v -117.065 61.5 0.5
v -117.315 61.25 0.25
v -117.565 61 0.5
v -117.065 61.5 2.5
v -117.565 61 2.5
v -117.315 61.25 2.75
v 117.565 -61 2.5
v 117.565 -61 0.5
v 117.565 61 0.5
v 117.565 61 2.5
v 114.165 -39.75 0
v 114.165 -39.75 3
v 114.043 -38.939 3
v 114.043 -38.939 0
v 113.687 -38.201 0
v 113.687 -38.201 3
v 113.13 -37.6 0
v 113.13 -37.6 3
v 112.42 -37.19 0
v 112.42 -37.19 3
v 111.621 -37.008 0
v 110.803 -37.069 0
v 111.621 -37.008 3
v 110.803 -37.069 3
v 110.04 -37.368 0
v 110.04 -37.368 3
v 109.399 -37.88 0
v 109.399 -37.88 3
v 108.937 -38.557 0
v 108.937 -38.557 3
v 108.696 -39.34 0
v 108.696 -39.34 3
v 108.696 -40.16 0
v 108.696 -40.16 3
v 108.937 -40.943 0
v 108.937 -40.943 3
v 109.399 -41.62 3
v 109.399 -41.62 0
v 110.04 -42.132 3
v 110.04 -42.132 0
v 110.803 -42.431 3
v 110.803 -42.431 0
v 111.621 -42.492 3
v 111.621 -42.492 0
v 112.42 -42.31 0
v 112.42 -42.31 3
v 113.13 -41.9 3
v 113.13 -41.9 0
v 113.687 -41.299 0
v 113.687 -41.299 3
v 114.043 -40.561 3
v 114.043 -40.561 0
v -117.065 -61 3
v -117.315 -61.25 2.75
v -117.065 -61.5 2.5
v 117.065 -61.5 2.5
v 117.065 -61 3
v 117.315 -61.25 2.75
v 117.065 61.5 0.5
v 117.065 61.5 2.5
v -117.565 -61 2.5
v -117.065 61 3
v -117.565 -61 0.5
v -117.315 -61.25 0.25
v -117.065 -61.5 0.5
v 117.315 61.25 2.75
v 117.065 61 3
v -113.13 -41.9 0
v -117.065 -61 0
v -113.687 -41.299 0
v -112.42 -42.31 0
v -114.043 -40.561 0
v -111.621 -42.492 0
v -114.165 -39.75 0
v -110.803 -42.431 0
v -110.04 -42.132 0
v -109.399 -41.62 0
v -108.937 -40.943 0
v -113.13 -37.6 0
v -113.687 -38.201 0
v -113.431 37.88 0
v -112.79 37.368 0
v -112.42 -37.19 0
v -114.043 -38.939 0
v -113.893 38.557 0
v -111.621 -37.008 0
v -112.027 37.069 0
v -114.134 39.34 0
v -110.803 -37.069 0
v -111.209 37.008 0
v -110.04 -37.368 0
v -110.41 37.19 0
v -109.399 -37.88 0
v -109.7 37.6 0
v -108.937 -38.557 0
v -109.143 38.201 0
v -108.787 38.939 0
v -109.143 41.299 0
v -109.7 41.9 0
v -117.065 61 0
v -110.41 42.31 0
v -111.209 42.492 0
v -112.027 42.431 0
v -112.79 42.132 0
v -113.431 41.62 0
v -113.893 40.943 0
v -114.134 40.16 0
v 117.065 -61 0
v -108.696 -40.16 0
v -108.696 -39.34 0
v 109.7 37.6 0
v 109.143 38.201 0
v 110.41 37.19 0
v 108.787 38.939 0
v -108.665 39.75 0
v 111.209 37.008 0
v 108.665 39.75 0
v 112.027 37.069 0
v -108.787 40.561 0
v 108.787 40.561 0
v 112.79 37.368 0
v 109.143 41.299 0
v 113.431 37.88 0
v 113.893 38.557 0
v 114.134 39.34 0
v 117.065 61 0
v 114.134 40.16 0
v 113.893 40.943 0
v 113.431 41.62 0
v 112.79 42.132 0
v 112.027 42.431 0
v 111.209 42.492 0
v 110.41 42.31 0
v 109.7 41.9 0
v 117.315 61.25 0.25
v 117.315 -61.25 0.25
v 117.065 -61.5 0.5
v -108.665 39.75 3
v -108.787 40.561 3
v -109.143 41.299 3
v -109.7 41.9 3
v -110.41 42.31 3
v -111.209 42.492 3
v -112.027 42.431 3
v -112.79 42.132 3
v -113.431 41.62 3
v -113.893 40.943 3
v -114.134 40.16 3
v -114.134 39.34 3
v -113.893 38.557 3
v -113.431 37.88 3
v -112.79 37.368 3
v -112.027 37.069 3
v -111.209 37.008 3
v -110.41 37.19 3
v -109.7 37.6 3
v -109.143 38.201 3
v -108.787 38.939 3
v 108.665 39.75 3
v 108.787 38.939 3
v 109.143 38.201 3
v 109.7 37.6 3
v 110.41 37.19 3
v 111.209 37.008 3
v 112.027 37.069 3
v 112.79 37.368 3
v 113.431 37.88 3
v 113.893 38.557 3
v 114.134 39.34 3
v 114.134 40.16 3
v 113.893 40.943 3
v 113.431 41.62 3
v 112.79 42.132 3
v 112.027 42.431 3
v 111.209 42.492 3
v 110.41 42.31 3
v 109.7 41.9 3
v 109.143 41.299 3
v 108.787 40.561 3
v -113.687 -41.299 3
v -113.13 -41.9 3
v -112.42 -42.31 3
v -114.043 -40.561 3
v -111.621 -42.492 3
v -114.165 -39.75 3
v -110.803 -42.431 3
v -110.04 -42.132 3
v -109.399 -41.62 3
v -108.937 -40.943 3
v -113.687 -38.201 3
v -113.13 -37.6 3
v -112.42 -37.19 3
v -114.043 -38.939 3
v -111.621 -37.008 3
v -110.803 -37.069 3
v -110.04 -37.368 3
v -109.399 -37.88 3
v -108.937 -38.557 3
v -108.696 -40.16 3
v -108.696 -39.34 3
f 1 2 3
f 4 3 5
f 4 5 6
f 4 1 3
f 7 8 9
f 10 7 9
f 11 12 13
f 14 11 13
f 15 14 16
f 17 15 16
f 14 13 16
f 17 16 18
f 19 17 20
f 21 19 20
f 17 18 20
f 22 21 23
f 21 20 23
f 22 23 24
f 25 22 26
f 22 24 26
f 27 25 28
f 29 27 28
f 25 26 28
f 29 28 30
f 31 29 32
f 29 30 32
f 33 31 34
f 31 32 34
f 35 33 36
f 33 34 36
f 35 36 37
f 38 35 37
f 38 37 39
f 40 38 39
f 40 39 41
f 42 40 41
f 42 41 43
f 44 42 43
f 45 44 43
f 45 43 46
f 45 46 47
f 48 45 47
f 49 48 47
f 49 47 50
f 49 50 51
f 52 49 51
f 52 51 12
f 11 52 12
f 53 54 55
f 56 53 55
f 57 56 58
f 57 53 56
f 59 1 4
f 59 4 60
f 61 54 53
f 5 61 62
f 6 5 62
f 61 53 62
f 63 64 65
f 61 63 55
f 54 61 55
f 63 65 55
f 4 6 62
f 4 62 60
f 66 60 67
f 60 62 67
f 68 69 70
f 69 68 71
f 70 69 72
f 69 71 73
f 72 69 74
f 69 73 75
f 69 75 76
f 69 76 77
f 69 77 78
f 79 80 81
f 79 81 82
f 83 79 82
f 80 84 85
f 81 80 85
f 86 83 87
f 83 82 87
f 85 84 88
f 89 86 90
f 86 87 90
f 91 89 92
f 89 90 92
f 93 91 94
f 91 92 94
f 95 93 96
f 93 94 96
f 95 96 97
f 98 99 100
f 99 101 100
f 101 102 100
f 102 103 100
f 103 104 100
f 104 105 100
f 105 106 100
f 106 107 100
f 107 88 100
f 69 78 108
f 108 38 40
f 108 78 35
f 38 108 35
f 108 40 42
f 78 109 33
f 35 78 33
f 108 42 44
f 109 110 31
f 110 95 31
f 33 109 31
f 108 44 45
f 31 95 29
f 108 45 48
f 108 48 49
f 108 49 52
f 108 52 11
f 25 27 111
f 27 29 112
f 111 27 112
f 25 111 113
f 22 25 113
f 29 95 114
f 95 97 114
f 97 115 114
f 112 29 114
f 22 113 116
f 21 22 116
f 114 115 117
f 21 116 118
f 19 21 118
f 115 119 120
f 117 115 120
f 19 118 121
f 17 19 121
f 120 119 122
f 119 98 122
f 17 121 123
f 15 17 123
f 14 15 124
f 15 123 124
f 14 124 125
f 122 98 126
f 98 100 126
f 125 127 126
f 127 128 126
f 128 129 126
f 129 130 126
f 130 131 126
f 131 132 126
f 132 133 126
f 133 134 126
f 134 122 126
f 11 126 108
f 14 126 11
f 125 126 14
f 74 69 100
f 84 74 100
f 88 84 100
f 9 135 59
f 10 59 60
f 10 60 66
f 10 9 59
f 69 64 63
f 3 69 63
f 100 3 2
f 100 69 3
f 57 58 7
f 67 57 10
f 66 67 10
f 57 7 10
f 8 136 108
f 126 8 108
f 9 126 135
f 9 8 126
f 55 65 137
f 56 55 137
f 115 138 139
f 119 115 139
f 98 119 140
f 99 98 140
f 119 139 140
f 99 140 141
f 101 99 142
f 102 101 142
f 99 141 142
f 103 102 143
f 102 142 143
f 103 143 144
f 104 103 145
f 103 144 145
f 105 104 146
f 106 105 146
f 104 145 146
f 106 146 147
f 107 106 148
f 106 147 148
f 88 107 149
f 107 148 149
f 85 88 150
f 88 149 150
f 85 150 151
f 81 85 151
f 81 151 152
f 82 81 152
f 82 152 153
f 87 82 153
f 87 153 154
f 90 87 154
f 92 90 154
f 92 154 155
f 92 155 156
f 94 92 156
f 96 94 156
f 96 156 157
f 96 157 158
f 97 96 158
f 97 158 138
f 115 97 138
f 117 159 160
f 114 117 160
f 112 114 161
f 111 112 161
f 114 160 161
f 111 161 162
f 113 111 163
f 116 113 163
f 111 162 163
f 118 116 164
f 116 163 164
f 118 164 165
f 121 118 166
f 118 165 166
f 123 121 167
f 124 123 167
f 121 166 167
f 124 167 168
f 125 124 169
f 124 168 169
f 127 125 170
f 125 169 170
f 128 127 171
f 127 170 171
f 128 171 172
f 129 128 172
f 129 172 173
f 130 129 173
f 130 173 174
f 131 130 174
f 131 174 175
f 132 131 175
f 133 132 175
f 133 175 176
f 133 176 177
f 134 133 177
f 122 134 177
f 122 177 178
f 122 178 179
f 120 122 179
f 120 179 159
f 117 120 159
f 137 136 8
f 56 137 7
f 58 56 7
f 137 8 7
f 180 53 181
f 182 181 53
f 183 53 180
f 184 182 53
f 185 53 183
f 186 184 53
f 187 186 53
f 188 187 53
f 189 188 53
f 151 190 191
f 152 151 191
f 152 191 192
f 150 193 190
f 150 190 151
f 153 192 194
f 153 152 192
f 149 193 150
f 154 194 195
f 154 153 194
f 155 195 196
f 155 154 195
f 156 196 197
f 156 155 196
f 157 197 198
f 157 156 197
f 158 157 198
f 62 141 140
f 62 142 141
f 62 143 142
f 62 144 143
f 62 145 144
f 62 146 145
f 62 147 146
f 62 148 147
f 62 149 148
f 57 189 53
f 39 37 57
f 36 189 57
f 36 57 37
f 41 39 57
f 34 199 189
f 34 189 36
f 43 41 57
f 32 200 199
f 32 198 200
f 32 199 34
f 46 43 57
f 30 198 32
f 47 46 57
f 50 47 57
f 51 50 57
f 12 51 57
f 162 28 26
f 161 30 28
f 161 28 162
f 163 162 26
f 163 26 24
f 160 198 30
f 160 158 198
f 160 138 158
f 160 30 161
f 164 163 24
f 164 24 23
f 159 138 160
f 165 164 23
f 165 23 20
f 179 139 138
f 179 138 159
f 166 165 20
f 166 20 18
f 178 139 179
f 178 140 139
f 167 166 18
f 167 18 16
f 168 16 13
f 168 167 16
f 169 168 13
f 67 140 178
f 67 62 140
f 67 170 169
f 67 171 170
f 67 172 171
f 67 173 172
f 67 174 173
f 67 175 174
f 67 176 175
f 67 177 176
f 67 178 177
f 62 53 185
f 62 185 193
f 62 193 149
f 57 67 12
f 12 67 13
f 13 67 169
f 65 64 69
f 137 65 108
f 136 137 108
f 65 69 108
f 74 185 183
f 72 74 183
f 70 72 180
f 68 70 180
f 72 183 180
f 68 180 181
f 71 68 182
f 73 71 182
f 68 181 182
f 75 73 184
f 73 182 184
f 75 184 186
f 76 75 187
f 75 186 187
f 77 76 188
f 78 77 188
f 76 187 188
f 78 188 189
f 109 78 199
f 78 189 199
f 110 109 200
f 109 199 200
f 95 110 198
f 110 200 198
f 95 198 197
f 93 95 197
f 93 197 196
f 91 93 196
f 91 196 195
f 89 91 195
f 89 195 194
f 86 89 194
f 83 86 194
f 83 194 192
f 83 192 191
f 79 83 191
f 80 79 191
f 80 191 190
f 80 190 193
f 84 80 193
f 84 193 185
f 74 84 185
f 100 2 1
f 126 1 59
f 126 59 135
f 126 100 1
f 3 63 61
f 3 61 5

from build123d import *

# Parameters (mm, degrees)
SKETCH1_W           = 235.13
SKETCH1_H           = 123
BOSS_EXTRUDE1_DEPTH = 3
SKETCH2_R           = 2.75
CUT_EXTRUDE1_DEPTH  = 133.713146391
CHAMFER1_SIZE       = 0.5
CHAMFER2_SIZE       = 0.5


with BuildPart() as part:
    # Sketch1 → Boss-Extrude1 (new body)
    with BuildSketch(Plane.XY):
        Rectangle(SKETCH1_W, SKETCH1_H)
    extrude(amount=BOSS_EXTRUDE1_DEPTH)

    # Sketch2 → Cut-Extrude1 (cut, through all)
    with BuildSketch(Plane.XY.offset(3)):
        with Locations((-111.415, 39.75)):
            Circle(SKETCH2_R)
        with Locations(Location((-111.415, -39.75, 0), (0, 0, 180))):
            Circle(SKETCH2_R)
        with Locations((111.415, -39.75)):
            Circle(SKETCH2_R)
        with Locations(Location((111.415, 39.75, 0), (0, 0, 180))):
            Circle(SKETCH2_R)
    extrude(amount=-CUT_EXTRUDE1_DEPTH, mode=Mode.SUBTRACT)

    # Chamfer1
    chamfer1_edges = [part.edges().sort_by_distance(p)[0] for p in [
        (-117.565, 0, 3),
        (0, -61.5, 3),
        (117.565, 0, 3),
        (0, -61.5, 0),
        (-117.565, 0, 0),
        (0, 61.5, 0),
        (117.565, 0, 0),
        (0, 61.5, 3),
    ]]
    chamfer(chamfer1_edges, length=CHAMFER1_SIZE)

    # Chamfer2
    chamfer2_edges = [part.edges().sort_by_distance(p)[0] for p in [
        (117.565, -61.5, 1.5),
        (-117.565, -61.5, 1.5),
        (-117.565, 61.5, 1.5),
        (117.565, 61.5, 1.5),
    ]]
    chamfer(chamfer2_edges, length=CHAMFER2_SIZE)


solid = part.part
